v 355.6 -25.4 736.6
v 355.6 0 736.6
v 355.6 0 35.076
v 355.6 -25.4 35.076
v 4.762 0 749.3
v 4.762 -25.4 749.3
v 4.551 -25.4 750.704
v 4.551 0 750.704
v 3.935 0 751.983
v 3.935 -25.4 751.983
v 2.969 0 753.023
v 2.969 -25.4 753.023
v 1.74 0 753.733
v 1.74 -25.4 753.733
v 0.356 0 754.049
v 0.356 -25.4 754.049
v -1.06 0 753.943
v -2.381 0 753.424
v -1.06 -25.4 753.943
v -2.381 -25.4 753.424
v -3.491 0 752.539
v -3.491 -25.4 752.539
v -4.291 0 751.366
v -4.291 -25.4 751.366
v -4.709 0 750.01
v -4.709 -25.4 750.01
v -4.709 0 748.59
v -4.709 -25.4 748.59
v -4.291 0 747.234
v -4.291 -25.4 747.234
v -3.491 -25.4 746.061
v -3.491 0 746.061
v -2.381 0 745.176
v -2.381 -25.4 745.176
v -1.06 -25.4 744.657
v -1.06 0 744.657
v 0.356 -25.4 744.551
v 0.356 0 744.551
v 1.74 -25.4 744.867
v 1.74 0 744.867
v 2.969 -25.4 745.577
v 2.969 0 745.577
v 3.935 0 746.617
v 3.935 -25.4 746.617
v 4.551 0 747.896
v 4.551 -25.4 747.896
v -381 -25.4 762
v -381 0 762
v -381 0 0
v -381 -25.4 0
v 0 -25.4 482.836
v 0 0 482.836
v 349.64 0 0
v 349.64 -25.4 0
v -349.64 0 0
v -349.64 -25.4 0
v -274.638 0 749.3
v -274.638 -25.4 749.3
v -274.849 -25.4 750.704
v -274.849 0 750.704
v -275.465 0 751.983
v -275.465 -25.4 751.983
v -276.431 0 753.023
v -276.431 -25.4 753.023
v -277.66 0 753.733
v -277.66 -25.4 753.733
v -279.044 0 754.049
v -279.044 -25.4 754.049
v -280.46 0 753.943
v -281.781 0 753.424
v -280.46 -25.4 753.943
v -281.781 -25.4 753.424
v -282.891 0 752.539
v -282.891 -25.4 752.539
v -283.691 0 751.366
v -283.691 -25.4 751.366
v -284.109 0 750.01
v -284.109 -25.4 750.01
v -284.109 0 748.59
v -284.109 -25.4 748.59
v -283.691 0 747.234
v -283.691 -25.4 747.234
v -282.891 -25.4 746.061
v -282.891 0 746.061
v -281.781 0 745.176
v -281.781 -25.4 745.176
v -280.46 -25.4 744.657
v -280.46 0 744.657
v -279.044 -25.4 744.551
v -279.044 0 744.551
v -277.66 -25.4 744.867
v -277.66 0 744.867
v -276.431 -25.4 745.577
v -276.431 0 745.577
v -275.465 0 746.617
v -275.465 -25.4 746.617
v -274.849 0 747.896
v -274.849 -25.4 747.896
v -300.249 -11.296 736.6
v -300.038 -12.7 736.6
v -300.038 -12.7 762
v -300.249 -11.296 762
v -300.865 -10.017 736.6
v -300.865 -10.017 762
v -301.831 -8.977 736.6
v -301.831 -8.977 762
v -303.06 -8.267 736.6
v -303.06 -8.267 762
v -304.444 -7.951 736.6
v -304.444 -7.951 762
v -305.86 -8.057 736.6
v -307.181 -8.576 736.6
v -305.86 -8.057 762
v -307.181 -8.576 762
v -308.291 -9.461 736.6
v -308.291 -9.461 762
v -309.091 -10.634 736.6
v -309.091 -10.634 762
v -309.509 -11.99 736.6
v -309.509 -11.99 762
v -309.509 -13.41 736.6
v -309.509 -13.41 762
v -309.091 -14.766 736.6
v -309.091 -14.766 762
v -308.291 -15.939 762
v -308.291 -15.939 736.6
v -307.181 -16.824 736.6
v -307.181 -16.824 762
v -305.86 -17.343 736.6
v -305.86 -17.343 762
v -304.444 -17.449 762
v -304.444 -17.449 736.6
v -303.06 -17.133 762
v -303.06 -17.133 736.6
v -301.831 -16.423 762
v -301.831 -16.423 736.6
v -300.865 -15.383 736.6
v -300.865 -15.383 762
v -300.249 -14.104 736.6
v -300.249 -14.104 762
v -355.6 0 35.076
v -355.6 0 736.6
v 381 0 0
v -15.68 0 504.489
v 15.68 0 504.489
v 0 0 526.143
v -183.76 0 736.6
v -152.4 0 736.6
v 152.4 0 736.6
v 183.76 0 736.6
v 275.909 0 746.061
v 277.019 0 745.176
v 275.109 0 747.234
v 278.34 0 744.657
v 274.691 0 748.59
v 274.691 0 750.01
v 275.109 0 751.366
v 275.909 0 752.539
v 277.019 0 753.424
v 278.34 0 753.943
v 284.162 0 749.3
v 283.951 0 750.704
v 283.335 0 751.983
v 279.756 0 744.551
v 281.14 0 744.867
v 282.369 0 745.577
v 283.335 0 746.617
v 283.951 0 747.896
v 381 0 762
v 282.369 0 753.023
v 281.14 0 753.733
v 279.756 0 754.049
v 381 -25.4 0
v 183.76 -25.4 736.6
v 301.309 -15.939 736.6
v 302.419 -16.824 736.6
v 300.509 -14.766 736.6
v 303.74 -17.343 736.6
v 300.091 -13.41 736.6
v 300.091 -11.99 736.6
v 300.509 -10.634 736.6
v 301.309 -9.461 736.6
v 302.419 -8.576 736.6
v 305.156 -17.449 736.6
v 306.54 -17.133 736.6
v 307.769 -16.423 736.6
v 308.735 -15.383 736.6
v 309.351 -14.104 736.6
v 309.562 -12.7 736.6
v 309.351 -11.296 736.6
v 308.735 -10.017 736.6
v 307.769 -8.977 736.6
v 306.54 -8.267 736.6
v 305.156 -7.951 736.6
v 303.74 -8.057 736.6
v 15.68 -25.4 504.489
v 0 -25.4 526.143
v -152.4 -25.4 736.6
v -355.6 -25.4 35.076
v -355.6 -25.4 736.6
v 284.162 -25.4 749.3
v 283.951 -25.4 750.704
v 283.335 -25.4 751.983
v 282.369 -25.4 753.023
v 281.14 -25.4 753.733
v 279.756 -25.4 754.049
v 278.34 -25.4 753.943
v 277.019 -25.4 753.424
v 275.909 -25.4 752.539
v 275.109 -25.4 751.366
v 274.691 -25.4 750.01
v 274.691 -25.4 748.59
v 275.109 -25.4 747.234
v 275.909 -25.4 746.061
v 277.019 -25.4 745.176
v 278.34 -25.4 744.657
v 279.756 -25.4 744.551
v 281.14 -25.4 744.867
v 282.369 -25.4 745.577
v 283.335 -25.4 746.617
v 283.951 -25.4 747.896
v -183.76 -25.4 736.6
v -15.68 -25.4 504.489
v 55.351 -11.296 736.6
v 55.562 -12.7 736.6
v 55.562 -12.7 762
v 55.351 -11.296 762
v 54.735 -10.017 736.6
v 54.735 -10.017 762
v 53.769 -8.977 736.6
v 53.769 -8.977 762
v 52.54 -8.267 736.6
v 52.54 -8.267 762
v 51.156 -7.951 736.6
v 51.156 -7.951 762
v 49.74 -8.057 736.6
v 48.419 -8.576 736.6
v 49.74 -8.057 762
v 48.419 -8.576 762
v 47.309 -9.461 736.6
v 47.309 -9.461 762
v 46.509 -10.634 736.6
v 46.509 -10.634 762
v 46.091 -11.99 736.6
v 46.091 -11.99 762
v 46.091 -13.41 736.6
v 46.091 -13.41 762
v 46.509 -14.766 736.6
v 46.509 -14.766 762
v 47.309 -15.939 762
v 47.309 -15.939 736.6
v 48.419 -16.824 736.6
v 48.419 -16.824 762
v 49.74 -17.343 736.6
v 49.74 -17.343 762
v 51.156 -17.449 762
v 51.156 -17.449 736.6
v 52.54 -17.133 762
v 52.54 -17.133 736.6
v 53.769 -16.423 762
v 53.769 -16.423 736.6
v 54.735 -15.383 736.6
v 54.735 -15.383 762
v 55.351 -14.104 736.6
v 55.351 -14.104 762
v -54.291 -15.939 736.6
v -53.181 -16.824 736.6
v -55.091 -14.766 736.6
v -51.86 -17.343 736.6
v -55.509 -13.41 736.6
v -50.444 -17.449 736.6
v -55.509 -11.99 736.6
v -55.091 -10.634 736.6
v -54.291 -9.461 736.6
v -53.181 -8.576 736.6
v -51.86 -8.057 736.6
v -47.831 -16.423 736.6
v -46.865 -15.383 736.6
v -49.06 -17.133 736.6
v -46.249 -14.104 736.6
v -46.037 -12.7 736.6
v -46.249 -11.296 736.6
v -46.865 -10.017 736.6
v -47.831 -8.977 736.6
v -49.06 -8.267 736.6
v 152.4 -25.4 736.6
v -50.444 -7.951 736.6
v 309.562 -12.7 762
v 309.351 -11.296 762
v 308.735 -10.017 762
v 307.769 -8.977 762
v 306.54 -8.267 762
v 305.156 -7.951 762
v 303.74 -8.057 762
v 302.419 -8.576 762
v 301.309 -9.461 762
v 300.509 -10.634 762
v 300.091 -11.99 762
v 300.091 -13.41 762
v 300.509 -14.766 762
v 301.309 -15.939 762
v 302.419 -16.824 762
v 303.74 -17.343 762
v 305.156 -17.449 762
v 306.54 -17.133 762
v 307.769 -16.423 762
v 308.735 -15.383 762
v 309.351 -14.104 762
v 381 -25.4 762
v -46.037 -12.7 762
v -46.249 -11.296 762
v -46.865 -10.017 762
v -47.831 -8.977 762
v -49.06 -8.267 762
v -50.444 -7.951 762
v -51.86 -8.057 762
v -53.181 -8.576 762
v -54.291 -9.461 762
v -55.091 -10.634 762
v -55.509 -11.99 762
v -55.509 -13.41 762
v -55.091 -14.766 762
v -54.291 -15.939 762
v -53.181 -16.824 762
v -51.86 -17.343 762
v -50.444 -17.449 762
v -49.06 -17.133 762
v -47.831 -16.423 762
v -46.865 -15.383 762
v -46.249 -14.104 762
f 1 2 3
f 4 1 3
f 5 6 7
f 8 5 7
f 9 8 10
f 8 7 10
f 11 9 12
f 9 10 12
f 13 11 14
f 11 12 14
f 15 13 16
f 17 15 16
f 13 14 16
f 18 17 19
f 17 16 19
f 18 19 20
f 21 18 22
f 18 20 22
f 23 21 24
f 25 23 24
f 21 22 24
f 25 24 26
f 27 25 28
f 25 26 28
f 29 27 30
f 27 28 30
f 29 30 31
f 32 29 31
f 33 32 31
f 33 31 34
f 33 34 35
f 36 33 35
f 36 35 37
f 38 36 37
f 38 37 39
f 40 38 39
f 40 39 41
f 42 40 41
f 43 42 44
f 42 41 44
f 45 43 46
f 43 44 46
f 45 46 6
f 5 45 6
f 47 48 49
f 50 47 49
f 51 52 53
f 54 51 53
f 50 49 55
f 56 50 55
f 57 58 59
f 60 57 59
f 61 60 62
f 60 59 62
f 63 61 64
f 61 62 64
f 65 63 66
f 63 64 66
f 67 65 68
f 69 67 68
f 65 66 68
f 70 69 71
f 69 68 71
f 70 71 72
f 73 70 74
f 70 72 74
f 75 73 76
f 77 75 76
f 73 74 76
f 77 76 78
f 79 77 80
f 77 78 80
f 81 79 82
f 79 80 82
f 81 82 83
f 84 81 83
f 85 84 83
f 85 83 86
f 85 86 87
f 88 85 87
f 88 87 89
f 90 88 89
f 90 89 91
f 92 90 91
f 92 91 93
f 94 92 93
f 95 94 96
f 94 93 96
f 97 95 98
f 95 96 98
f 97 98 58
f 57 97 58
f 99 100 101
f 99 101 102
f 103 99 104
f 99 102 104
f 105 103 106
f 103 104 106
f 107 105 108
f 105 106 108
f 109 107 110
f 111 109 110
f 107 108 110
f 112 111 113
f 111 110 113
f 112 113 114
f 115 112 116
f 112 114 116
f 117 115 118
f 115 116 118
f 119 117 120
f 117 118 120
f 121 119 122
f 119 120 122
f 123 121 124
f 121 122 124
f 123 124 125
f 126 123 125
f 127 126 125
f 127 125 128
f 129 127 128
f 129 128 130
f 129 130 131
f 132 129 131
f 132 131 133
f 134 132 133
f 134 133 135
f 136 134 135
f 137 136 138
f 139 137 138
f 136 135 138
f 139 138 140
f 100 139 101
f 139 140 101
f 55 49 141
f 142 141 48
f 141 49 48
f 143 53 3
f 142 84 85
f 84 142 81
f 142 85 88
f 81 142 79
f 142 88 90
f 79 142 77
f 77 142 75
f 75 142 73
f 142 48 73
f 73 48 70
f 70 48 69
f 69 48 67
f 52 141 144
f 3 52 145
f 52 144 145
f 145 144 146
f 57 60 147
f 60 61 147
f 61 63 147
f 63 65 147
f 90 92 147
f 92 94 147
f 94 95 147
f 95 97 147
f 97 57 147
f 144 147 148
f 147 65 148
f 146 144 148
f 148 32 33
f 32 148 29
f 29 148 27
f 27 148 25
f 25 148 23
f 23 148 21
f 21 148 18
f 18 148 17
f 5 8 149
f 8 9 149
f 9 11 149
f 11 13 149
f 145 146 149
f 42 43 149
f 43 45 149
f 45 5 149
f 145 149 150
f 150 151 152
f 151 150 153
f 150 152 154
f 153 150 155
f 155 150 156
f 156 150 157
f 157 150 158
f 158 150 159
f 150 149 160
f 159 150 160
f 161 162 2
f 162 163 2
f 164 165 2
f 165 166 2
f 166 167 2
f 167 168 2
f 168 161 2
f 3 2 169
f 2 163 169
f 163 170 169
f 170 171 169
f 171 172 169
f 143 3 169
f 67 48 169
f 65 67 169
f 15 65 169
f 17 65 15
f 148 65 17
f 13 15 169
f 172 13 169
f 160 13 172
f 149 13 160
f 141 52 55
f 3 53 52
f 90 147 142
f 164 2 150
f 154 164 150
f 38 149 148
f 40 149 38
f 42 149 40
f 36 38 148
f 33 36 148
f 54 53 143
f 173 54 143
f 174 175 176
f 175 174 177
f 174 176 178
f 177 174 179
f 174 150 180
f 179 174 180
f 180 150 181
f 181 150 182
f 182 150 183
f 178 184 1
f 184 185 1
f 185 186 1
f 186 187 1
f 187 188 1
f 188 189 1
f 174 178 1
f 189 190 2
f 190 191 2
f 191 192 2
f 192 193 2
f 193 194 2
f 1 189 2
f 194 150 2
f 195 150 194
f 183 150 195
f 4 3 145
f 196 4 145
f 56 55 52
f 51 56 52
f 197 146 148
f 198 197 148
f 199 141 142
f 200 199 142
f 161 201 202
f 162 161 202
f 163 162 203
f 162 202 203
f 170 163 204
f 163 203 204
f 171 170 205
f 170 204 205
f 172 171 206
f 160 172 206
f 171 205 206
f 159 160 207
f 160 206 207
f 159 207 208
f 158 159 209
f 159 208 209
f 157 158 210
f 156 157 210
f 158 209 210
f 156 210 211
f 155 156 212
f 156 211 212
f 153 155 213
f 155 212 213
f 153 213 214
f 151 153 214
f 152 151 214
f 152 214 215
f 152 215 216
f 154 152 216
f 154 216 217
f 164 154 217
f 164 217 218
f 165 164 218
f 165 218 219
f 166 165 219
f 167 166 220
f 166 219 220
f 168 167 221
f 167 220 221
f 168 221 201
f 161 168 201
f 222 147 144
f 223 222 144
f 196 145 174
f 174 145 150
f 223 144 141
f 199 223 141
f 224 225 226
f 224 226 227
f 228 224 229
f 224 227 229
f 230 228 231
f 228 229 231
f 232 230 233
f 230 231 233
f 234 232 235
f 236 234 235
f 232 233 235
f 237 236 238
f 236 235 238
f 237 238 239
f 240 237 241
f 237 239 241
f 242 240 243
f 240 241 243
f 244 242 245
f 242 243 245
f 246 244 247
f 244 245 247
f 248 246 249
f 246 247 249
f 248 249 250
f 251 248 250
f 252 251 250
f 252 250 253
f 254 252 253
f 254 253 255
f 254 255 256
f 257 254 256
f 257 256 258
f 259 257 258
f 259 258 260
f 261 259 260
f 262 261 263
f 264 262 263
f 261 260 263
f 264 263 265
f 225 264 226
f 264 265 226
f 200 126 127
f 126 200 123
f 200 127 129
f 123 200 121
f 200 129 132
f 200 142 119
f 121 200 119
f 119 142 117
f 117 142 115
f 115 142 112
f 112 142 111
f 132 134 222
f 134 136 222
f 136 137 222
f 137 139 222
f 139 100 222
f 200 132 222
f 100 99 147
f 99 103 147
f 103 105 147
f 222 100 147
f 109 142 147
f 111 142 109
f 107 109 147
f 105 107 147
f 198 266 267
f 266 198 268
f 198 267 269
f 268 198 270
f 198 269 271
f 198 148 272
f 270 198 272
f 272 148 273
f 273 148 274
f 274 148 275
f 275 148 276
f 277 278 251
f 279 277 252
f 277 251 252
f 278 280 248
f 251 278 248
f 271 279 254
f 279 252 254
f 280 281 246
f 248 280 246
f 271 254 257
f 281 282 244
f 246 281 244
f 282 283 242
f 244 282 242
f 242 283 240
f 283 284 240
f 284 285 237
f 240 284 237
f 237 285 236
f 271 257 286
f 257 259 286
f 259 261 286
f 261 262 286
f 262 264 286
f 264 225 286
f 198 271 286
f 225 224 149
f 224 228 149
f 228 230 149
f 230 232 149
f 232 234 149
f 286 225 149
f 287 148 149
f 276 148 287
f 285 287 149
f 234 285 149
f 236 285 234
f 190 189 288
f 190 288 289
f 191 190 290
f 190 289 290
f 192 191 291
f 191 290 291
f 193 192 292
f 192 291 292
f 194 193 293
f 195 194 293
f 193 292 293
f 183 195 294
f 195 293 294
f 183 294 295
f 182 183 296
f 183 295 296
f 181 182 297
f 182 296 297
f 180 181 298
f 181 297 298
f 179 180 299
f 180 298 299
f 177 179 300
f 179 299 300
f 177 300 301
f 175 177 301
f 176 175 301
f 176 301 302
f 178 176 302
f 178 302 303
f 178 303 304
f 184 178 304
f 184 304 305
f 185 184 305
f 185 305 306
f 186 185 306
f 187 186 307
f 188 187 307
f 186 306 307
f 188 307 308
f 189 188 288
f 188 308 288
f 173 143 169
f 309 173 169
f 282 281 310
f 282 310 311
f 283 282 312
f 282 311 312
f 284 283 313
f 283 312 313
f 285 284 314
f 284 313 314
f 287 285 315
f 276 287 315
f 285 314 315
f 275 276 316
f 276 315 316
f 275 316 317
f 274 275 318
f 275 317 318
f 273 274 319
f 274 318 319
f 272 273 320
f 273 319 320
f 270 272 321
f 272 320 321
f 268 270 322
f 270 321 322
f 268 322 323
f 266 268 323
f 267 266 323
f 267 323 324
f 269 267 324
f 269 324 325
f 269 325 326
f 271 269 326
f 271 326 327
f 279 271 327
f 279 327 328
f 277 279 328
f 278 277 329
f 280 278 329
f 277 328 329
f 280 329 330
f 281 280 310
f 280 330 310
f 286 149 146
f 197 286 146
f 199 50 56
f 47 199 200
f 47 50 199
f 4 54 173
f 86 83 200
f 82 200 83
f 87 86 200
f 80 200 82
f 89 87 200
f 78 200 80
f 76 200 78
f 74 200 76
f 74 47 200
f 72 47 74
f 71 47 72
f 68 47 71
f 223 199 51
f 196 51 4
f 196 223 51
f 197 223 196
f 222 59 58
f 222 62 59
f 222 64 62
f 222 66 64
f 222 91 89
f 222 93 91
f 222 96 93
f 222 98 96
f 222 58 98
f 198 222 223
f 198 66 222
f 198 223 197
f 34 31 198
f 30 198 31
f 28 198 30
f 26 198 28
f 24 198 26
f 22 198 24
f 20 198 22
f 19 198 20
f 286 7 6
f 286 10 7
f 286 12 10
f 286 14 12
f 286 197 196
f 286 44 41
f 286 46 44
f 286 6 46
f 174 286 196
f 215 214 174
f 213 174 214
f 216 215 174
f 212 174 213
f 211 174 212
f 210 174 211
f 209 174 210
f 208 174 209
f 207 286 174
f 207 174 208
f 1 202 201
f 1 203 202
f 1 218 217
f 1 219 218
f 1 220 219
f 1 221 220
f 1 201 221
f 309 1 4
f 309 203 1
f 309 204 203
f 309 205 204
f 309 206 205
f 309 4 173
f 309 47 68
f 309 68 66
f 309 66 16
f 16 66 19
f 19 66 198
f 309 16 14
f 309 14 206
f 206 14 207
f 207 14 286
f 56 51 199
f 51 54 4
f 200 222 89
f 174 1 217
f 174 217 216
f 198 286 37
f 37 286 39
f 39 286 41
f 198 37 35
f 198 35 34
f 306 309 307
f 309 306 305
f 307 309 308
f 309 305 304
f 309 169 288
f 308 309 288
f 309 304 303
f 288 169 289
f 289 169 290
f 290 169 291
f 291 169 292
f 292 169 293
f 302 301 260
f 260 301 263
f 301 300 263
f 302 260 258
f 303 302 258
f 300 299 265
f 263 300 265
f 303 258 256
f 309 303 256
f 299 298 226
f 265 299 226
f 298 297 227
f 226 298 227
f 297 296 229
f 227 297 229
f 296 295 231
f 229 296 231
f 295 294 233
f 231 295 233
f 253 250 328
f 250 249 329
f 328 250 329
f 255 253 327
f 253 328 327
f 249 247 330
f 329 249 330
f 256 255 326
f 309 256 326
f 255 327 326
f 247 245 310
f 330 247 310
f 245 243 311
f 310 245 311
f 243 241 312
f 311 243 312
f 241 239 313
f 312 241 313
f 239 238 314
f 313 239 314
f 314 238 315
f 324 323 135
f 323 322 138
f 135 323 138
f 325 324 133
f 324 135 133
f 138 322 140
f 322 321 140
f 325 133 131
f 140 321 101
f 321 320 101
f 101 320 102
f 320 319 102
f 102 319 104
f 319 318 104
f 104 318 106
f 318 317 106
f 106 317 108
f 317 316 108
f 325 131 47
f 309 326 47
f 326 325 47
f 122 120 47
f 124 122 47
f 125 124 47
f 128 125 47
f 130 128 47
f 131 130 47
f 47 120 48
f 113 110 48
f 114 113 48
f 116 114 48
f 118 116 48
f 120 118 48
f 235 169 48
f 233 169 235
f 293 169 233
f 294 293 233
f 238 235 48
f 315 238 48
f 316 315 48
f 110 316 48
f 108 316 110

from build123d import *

# Parameters (mm, degrees)
F1_DEPTH = 25.4
F2_R     = 4.7625
F3_DEPTH = 25.4
F4_R     = 4.7625
F5_DEPTH = 25.4


with BuildPart() as f1:
    # F0 (on Front) → F1 (new body)
    with BuildSketch(Plane.XZ):
        Polygon((381, 762), (-381, 762), (-381, 0), (-349.639734, 0), (0, 482.835824), (349.639734, 0), (381, 0), align=None)
        Polygon((-355.6, 35.07619), (-355.6, 736.6), (-183.760266, 736.6), (-15.680133, 504.48934), align=None, mode=Mode.SUBTRACT)
        Polygon((183.760266, 736.6), (355.6, 736.6), (355.6, 35.07619), (15.680133, 504.48934), align=None, mode=Mode.SUBTRACT)
        Polygon((0, 526.142857), (-152.4, 736.6), (152.4, 736.6), align=None, mode=Mode.SUBTRACT)
    extrude(amount=F1_DEPTH)

    # F2 (on face) → F3 (cut)
    with BuildSketch(Plane.XZ.offset(25.4)):
        with Locations((-279.4, 749.3)):
            Circle(F2_R)
        with Locations((0, 749.3)):
            Circle(F2_R)
        with Locations((279.4, 749.3)):
            Circle(F2_R)
    extrude(amount=-F3_DEPTH, mode=Mode.SUBTRACT)

    # F4 (on face) → F5 (cut)
    with BuildSketch(Plane.XY.offset(762)):
        with Locations((-50.8, -12.7)):
            Circle(F4_R)
        with Locations((50.8, -12.7)):
            Circle(F4_R)
        with Locations((304.8, -12.7)):
            Circle(F4_R)
        with Locations((-304.8, -12.7)):
            Circle(F4_R)
    extrude(amount=-F5_DEPTH, mode=Mode.SUBTRACT)


solid = f1.part
